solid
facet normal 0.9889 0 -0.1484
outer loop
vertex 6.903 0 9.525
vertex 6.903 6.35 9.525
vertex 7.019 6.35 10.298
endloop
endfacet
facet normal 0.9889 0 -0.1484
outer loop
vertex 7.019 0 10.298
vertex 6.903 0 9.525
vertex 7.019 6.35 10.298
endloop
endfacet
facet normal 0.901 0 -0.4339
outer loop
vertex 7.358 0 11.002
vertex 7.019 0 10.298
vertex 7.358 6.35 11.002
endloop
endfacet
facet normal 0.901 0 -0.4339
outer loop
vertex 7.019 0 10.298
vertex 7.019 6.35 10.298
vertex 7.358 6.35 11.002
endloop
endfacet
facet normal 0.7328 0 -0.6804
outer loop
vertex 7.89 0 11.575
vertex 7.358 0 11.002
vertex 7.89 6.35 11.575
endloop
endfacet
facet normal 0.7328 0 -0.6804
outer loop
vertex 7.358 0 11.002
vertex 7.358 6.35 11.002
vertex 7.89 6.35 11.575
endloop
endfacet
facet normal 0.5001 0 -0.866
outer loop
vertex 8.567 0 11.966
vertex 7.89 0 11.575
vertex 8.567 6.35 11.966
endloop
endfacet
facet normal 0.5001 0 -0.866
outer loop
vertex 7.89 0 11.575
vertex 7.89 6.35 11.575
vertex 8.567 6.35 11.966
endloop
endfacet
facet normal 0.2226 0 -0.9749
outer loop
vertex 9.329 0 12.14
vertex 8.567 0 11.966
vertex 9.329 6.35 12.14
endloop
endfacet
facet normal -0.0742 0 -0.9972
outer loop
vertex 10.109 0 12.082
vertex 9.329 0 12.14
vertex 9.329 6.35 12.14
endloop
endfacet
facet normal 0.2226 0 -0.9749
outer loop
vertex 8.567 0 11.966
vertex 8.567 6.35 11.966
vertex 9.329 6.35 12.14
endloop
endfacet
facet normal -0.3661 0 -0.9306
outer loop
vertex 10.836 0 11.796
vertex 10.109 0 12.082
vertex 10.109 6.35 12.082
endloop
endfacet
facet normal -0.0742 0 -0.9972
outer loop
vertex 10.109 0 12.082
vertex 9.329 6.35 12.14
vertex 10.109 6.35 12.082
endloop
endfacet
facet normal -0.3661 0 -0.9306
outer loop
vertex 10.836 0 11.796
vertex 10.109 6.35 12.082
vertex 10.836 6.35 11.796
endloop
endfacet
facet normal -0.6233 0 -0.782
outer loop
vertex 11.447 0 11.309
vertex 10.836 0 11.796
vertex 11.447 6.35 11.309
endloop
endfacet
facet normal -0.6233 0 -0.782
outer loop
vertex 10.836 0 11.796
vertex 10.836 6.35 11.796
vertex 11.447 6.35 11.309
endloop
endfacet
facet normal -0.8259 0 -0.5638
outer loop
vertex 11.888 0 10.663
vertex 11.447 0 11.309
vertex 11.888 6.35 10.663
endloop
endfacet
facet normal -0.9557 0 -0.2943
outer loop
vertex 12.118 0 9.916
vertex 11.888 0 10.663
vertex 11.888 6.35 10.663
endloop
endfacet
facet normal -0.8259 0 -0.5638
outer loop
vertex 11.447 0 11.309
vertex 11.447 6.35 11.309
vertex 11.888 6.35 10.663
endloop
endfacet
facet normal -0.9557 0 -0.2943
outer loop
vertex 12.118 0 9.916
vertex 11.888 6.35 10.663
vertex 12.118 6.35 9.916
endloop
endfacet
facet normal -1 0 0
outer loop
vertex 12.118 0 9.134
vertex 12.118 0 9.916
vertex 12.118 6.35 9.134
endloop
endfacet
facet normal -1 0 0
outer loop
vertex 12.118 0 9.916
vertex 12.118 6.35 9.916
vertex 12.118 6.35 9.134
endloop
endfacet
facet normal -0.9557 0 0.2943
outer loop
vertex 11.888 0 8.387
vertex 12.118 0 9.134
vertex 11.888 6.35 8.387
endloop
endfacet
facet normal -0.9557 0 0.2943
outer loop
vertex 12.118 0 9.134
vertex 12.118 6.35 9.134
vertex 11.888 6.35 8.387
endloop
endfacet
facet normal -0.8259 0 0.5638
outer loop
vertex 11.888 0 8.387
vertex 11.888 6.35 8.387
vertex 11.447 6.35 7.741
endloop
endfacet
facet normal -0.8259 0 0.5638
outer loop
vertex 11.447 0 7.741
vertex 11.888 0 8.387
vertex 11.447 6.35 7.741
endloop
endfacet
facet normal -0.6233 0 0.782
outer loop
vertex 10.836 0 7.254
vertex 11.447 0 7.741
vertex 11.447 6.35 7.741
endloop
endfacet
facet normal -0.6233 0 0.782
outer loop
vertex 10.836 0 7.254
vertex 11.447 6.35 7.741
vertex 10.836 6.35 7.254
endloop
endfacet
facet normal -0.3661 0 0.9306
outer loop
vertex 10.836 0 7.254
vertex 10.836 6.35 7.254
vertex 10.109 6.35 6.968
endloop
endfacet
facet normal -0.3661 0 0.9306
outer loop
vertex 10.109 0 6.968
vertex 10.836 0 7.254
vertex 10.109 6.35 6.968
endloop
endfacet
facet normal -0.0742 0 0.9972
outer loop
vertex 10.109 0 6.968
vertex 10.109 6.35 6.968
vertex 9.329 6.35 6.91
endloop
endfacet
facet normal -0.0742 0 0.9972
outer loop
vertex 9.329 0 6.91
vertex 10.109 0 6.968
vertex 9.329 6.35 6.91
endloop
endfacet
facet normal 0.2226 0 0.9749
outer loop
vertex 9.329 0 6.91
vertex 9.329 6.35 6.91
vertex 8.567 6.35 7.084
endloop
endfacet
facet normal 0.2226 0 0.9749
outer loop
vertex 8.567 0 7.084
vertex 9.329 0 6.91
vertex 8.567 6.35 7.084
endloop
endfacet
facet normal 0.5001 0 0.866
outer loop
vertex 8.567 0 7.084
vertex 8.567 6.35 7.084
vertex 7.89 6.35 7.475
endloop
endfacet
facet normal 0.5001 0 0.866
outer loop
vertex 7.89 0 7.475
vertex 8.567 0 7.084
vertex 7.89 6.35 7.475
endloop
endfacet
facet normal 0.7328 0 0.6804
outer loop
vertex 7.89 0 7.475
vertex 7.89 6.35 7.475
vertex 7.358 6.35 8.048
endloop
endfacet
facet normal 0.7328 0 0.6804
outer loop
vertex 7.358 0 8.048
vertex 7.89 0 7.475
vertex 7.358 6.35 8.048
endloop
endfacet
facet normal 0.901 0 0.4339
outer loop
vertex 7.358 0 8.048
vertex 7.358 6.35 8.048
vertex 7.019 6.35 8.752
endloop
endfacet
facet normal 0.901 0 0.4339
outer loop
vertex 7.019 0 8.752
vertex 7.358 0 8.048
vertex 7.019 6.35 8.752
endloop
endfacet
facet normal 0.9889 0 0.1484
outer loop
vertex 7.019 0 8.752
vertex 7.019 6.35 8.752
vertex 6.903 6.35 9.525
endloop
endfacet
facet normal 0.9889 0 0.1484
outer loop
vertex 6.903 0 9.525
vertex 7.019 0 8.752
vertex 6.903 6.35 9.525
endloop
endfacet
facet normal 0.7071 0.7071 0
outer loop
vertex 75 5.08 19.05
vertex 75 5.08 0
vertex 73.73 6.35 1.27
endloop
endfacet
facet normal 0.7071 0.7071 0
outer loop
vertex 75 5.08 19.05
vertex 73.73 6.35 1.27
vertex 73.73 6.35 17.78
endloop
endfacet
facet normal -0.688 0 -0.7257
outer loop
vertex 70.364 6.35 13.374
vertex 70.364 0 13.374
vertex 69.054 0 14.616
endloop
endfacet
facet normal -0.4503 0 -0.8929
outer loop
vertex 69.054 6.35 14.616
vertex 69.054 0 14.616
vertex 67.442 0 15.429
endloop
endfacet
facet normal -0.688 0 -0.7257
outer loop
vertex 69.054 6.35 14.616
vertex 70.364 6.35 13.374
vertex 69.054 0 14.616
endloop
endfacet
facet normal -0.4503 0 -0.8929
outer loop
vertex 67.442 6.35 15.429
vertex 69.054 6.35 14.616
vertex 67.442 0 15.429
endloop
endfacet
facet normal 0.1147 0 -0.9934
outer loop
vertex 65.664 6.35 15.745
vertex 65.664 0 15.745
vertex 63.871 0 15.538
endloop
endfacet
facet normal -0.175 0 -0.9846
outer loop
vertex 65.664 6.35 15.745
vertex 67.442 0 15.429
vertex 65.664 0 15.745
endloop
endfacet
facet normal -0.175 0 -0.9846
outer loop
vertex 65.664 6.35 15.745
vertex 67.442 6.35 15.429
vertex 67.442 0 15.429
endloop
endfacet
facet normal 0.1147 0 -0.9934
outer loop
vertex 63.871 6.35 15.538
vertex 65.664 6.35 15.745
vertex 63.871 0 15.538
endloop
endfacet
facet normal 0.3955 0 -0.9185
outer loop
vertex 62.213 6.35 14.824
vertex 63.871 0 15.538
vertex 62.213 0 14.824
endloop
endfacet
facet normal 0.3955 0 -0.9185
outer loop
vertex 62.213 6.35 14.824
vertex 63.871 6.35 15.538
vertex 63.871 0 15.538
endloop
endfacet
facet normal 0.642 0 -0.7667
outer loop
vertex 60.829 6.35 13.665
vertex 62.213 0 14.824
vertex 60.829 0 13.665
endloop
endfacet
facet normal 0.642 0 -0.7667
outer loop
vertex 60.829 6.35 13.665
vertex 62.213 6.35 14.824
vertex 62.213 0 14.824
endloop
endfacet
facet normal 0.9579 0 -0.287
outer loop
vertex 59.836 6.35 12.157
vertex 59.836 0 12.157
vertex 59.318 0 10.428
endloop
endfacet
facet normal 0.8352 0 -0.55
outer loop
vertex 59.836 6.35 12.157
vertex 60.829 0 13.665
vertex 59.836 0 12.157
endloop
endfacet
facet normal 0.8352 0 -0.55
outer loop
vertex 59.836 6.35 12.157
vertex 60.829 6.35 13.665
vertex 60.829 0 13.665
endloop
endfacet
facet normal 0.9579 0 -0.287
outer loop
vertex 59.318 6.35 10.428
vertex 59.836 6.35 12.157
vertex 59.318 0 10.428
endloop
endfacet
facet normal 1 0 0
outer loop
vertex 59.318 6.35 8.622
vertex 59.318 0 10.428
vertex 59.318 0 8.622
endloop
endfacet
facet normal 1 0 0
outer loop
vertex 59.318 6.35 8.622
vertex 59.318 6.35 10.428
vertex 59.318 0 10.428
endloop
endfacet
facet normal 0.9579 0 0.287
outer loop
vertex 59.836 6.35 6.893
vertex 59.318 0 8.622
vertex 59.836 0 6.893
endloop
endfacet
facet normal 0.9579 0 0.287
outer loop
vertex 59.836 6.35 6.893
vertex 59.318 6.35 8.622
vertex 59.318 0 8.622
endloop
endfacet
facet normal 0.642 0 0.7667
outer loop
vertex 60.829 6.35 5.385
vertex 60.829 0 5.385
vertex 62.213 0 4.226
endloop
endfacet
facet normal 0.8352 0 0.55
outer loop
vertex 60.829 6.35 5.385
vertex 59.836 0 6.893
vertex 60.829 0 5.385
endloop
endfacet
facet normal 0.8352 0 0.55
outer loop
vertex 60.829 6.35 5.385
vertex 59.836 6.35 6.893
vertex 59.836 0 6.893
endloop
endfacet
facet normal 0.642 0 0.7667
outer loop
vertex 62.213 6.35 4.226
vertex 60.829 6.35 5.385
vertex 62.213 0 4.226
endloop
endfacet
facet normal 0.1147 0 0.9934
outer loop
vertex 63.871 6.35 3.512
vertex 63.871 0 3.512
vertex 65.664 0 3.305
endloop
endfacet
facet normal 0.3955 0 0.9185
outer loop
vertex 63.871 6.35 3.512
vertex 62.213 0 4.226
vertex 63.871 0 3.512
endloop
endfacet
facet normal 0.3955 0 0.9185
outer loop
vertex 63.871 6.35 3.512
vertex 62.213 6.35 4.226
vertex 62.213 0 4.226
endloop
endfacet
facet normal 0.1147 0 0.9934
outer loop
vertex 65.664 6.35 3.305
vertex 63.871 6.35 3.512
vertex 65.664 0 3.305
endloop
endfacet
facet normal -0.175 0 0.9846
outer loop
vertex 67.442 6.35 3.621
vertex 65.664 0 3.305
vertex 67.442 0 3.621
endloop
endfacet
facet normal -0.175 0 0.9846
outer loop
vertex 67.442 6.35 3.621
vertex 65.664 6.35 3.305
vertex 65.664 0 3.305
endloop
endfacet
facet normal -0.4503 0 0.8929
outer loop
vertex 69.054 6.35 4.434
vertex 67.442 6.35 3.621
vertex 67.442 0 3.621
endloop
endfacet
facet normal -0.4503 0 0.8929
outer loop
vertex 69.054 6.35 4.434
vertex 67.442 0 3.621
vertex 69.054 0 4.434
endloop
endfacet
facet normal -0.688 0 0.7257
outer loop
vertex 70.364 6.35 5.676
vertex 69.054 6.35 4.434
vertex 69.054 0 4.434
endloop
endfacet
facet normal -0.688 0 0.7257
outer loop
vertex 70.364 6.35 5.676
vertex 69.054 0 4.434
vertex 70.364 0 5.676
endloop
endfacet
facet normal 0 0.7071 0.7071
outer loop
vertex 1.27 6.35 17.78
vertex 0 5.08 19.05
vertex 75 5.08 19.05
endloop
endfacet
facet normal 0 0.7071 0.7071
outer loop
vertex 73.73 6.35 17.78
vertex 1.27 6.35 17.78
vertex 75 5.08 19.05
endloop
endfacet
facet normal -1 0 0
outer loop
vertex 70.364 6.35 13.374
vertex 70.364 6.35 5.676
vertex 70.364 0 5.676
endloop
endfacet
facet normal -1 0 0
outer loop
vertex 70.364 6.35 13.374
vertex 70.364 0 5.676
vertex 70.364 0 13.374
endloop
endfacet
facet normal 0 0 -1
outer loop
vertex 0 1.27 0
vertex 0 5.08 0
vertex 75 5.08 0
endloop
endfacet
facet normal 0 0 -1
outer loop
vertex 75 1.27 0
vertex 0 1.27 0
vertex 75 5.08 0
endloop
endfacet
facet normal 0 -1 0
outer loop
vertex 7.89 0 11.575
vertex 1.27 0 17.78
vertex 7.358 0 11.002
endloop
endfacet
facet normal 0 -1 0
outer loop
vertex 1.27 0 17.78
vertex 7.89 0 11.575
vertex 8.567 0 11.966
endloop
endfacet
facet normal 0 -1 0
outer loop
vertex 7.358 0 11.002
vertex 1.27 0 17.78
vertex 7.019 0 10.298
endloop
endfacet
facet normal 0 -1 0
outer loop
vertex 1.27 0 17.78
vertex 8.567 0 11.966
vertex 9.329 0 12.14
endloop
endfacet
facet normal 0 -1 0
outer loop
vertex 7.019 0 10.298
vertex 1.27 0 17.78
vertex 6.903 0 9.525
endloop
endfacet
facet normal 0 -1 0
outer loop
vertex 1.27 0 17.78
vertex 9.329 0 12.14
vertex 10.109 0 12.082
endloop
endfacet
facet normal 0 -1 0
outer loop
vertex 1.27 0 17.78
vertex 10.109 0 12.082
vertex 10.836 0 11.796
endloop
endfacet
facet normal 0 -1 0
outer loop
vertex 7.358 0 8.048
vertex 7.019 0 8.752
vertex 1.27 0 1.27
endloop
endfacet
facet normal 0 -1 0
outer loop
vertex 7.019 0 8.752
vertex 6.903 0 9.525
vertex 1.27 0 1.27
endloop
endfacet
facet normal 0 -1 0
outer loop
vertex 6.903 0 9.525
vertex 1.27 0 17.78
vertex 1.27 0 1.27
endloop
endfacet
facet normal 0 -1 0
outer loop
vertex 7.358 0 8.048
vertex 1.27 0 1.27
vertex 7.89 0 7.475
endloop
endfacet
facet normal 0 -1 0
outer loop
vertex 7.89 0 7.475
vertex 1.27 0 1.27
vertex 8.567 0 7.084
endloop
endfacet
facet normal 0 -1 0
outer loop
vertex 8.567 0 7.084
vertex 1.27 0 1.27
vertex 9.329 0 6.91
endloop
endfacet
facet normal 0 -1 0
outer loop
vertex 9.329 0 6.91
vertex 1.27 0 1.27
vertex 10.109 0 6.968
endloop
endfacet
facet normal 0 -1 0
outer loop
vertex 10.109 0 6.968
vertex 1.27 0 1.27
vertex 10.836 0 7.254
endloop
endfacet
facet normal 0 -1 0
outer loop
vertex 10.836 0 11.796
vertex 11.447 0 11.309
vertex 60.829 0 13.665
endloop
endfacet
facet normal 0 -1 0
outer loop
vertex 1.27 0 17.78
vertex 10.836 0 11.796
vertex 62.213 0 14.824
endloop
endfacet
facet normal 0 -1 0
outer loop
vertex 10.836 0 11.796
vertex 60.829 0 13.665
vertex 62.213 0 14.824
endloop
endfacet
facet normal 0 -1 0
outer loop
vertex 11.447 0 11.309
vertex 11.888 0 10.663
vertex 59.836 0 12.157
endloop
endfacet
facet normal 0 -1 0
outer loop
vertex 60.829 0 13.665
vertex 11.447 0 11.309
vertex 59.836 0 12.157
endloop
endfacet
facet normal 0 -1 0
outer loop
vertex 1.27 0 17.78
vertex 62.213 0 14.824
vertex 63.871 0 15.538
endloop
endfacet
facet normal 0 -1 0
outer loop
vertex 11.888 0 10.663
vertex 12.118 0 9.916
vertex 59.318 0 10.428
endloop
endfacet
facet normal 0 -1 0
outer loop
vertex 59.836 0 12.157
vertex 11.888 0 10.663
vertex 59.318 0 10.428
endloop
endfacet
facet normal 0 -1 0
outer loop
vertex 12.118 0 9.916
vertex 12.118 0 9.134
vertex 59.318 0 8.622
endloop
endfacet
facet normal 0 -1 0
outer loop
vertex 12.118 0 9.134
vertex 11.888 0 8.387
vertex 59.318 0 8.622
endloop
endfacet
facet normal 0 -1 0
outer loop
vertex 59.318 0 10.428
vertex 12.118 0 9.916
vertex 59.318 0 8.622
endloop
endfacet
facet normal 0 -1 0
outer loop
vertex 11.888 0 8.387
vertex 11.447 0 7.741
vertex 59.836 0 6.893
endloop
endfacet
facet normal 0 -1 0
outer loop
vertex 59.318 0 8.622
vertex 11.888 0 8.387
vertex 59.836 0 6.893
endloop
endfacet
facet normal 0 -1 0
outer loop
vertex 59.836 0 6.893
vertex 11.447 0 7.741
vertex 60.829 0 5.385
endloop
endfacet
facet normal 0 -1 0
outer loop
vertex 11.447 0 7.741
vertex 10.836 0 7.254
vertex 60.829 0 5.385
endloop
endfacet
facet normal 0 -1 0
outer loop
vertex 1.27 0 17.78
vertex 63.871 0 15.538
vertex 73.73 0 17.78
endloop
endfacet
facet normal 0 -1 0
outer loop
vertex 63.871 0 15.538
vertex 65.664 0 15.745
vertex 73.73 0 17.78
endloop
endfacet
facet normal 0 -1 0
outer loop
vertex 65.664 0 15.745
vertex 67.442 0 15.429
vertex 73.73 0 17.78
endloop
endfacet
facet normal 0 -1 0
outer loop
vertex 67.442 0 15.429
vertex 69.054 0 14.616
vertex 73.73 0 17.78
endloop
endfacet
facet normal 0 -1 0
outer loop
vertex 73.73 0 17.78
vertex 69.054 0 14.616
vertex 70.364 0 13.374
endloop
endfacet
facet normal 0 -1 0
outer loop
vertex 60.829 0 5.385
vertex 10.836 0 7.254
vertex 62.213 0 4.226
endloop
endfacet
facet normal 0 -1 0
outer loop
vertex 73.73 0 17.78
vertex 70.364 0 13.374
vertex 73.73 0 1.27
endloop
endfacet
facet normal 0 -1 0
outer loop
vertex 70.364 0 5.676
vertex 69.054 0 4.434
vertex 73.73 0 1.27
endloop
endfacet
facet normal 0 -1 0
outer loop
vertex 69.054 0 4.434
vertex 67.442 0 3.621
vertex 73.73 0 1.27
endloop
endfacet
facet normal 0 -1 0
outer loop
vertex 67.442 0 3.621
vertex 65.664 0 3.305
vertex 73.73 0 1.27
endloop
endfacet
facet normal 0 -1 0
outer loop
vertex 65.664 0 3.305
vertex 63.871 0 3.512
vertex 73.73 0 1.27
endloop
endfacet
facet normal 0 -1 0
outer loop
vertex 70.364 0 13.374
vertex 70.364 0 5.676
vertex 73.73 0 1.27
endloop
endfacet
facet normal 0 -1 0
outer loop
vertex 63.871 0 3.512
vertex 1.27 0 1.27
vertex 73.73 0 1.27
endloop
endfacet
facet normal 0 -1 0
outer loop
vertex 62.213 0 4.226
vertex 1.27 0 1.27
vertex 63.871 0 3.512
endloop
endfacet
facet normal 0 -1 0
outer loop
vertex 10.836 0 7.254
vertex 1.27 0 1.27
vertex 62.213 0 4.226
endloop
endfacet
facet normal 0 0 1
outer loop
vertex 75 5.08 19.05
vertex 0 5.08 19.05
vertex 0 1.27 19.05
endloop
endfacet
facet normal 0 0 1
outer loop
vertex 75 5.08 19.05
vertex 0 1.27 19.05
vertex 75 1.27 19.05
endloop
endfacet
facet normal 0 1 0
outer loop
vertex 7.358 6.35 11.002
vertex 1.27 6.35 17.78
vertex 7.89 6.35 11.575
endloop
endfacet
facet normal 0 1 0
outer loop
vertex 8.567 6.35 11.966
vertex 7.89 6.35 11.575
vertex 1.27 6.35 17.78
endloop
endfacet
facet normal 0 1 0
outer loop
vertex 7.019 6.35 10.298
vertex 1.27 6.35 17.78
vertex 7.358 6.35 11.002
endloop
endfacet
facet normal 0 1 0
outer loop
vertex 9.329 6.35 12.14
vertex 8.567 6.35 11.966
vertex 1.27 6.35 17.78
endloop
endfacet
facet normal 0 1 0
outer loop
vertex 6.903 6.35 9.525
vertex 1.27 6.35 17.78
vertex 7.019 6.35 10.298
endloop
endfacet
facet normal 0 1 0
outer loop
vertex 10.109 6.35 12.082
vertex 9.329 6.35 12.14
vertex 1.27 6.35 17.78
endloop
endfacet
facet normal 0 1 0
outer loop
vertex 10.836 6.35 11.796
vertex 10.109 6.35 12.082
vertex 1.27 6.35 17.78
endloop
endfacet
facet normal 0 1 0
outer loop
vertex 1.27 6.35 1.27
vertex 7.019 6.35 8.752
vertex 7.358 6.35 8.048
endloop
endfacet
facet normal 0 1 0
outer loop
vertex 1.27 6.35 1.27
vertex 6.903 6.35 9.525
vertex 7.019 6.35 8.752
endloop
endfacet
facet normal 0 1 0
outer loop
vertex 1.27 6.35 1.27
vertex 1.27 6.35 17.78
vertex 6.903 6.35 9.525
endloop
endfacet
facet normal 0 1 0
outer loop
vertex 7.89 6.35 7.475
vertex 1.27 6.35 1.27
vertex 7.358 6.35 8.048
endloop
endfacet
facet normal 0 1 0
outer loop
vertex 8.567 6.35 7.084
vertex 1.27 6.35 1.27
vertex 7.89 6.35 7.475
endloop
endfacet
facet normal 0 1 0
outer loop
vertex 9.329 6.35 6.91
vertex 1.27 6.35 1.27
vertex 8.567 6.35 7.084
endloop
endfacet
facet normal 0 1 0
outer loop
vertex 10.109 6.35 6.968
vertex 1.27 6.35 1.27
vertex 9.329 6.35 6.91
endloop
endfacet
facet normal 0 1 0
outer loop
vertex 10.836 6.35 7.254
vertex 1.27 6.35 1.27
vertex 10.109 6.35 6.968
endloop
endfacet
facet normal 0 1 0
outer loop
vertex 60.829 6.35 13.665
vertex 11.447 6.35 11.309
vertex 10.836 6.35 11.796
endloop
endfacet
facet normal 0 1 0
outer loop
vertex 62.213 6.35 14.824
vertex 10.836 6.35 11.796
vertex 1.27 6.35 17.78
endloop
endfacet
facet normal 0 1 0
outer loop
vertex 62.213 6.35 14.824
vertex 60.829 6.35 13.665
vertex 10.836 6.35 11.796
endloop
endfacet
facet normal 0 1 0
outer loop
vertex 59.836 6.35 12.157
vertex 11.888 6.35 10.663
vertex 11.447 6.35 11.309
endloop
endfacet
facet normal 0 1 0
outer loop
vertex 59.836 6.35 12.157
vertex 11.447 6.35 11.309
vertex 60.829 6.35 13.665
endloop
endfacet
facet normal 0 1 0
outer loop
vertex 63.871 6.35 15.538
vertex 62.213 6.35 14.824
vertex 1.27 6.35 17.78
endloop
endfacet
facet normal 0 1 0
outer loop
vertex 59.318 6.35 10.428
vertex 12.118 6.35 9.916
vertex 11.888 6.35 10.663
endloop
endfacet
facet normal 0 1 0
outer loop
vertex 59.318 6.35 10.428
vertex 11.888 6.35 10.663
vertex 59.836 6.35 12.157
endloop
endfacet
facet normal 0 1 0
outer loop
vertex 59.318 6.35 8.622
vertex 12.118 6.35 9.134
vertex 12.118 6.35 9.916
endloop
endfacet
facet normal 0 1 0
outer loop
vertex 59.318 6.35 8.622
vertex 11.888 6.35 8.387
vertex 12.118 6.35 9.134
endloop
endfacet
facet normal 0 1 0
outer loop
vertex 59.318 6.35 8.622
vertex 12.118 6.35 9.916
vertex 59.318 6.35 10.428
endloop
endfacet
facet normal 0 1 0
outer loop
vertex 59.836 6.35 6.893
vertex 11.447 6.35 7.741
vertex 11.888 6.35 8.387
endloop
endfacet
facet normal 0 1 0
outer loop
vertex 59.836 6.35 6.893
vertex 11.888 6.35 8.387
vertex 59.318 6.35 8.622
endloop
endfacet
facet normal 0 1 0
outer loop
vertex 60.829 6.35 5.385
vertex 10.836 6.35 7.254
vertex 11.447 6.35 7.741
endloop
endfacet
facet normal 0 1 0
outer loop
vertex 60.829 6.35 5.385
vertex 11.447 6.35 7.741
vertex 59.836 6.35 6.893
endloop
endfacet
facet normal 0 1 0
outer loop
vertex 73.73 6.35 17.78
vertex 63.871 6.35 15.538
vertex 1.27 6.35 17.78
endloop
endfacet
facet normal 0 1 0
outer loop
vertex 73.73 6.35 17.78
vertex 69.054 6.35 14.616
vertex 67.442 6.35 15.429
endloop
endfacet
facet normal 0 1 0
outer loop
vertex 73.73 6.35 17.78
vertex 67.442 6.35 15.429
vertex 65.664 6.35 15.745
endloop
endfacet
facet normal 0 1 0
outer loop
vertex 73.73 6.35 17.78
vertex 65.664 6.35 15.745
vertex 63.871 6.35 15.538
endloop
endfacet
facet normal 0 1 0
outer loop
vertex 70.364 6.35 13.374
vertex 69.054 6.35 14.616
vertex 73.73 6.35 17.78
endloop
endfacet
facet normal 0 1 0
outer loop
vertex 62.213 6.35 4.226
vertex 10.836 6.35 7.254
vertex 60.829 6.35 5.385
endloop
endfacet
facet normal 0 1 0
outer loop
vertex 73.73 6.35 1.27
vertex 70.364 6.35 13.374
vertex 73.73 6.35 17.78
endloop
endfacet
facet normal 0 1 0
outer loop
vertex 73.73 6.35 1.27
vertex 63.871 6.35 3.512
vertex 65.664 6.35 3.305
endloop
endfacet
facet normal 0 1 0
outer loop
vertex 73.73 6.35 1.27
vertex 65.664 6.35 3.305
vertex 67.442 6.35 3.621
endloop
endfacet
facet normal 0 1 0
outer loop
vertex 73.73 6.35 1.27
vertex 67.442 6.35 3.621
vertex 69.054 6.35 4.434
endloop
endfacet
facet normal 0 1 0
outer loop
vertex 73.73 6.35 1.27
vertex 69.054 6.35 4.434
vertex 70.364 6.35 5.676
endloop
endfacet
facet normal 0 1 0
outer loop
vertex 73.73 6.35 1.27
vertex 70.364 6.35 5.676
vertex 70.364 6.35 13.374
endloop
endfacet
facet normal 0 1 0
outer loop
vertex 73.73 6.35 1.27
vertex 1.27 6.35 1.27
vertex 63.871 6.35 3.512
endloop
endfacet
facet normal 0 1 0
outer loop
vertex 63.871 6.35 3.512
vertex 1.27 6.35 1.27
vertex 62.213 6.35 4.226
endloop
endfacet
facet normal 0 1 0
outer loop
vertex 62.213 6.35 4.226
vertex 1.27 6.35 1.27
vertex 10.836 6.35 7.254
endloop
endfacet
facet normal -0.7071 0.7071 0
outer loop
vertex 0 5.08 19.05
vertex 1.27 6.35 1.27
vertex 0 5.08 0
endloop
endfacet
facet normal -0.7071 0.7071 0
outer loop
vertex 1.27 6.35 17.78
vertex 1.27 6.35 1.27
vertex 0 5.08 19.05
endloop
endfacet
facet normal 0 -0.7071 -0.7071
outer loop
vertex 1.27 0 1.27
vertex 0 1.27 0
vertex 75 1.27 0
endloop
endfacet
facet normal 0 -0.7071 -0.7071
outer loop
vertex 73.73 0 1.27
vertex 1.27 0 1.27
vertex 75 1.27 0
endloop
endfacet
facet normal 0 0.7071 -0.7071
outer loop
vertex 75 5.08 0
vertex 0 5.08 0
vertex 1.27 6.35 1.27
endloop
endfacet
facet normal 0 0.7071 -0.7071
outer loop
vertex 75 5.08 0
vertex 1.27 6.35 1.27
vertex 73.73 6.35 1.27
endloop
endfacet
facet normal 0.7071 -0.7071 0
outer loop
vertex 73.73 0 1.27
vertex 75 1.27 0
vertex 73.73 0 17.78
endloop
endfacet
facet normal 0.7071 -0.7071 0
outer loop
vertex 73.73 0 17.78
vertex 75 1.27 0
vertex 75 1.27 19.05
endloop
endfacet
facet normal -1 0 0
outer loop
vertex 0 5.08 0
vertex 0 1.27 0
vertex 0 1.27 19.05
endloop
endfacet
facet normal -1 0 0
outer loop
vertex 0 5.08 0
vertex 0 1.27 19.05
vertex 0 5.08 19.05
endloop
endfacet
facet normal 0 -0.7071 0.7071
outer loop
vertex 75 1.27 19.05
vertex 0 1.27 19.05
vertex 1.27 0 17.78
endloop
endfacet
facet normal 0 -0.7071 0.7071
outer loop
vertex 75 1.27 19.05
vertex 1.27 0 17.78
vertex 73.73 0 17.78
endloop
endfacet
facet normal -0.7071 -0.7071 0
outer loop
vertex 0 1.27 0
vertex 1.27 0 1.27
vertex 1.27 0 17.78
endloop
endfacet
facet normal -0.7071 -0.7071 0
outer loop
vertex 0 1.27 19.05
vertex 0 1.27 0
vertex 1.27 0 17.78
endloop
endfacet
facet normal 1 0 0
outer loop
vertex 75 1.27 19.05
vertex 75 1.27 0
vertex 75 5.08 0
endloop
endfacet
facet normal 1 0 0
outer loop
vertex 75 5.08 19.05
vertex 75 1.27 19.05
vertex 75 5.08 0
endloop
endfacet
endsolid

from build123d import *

# Parameters (mm, degrees)
SKETCH1_W          = 75
SKETCH1_H          = 6.35
BASE_EXTRUDE_DEPTH = 19.05
CUT_EXTRUDE1_DEPTH = 7.35
SKETCH3_R          = 2.622460094
CUT_EXTRUDE2_DEPTH = 7.35
CHAMFER1_SIZE      = 1.27


with BuildPart() as part:
    # Sketch1 → Base-Extrude (new body)
    with BuildSketch(Plane.XY):
        with Locations((37.5, 3.175)):
            Rectangle(SKETCH1_W, SKETCH1_H)
    extrude(amount=BASE_EXTRUDE_DEPTH)

    # Sketch2 → Cut-Extrude1 (cut, through all)
    with BuildSketch(Plane(origin=(0, 6.35, 0), x_dir=(-1, 0, 0), z_dir=(0, 1, 0))):
        with BuildLine():
            Line((-70.3645, 5.67551708), (-70.3645, 13.37448292))
            ThreePointArc((-70.3645, 13.37448292), (-59.252, 9.525), (-70.3645, 5.67551708))
        make_face()
    extrude(amount=-CUT_EXTRUDE1_DEPTH, mode=Mode.SUBTRACT)

    # Sketch3 → Cut-Extrude2 (cut, through all)
    with BuildSketch(Plane(origin=(0, 6.35, 0), x_dir=(-1, 0, 0), z_dir=(0, 1, 0))):
        with Locations((-9.525, 9.525)):
            Circle(SKETCH3_R)
    extrude(amount=-CUT_EXTRUDE2_DEPTH, mode=Mode.SUBTRACT)

    # Chamfer1
    chamfer1_edges = [part.edges().sort_by_distance(p)[0] for p in [
        (37.5, 0, 19.05),
        (37.5, 0, 0),
        (37.5, 6.35, 0),
        (37.5, 6.35, 19.05),
        (0, 0, 9.525),
        (75, 0, 9.525),
        (75, 6.35, 9.525),
        (0, 6.35, 9.525),
    ]]
    chamfer(chamfer1_edges, length=CHAMFER1_SIZE)


solid = part.part
